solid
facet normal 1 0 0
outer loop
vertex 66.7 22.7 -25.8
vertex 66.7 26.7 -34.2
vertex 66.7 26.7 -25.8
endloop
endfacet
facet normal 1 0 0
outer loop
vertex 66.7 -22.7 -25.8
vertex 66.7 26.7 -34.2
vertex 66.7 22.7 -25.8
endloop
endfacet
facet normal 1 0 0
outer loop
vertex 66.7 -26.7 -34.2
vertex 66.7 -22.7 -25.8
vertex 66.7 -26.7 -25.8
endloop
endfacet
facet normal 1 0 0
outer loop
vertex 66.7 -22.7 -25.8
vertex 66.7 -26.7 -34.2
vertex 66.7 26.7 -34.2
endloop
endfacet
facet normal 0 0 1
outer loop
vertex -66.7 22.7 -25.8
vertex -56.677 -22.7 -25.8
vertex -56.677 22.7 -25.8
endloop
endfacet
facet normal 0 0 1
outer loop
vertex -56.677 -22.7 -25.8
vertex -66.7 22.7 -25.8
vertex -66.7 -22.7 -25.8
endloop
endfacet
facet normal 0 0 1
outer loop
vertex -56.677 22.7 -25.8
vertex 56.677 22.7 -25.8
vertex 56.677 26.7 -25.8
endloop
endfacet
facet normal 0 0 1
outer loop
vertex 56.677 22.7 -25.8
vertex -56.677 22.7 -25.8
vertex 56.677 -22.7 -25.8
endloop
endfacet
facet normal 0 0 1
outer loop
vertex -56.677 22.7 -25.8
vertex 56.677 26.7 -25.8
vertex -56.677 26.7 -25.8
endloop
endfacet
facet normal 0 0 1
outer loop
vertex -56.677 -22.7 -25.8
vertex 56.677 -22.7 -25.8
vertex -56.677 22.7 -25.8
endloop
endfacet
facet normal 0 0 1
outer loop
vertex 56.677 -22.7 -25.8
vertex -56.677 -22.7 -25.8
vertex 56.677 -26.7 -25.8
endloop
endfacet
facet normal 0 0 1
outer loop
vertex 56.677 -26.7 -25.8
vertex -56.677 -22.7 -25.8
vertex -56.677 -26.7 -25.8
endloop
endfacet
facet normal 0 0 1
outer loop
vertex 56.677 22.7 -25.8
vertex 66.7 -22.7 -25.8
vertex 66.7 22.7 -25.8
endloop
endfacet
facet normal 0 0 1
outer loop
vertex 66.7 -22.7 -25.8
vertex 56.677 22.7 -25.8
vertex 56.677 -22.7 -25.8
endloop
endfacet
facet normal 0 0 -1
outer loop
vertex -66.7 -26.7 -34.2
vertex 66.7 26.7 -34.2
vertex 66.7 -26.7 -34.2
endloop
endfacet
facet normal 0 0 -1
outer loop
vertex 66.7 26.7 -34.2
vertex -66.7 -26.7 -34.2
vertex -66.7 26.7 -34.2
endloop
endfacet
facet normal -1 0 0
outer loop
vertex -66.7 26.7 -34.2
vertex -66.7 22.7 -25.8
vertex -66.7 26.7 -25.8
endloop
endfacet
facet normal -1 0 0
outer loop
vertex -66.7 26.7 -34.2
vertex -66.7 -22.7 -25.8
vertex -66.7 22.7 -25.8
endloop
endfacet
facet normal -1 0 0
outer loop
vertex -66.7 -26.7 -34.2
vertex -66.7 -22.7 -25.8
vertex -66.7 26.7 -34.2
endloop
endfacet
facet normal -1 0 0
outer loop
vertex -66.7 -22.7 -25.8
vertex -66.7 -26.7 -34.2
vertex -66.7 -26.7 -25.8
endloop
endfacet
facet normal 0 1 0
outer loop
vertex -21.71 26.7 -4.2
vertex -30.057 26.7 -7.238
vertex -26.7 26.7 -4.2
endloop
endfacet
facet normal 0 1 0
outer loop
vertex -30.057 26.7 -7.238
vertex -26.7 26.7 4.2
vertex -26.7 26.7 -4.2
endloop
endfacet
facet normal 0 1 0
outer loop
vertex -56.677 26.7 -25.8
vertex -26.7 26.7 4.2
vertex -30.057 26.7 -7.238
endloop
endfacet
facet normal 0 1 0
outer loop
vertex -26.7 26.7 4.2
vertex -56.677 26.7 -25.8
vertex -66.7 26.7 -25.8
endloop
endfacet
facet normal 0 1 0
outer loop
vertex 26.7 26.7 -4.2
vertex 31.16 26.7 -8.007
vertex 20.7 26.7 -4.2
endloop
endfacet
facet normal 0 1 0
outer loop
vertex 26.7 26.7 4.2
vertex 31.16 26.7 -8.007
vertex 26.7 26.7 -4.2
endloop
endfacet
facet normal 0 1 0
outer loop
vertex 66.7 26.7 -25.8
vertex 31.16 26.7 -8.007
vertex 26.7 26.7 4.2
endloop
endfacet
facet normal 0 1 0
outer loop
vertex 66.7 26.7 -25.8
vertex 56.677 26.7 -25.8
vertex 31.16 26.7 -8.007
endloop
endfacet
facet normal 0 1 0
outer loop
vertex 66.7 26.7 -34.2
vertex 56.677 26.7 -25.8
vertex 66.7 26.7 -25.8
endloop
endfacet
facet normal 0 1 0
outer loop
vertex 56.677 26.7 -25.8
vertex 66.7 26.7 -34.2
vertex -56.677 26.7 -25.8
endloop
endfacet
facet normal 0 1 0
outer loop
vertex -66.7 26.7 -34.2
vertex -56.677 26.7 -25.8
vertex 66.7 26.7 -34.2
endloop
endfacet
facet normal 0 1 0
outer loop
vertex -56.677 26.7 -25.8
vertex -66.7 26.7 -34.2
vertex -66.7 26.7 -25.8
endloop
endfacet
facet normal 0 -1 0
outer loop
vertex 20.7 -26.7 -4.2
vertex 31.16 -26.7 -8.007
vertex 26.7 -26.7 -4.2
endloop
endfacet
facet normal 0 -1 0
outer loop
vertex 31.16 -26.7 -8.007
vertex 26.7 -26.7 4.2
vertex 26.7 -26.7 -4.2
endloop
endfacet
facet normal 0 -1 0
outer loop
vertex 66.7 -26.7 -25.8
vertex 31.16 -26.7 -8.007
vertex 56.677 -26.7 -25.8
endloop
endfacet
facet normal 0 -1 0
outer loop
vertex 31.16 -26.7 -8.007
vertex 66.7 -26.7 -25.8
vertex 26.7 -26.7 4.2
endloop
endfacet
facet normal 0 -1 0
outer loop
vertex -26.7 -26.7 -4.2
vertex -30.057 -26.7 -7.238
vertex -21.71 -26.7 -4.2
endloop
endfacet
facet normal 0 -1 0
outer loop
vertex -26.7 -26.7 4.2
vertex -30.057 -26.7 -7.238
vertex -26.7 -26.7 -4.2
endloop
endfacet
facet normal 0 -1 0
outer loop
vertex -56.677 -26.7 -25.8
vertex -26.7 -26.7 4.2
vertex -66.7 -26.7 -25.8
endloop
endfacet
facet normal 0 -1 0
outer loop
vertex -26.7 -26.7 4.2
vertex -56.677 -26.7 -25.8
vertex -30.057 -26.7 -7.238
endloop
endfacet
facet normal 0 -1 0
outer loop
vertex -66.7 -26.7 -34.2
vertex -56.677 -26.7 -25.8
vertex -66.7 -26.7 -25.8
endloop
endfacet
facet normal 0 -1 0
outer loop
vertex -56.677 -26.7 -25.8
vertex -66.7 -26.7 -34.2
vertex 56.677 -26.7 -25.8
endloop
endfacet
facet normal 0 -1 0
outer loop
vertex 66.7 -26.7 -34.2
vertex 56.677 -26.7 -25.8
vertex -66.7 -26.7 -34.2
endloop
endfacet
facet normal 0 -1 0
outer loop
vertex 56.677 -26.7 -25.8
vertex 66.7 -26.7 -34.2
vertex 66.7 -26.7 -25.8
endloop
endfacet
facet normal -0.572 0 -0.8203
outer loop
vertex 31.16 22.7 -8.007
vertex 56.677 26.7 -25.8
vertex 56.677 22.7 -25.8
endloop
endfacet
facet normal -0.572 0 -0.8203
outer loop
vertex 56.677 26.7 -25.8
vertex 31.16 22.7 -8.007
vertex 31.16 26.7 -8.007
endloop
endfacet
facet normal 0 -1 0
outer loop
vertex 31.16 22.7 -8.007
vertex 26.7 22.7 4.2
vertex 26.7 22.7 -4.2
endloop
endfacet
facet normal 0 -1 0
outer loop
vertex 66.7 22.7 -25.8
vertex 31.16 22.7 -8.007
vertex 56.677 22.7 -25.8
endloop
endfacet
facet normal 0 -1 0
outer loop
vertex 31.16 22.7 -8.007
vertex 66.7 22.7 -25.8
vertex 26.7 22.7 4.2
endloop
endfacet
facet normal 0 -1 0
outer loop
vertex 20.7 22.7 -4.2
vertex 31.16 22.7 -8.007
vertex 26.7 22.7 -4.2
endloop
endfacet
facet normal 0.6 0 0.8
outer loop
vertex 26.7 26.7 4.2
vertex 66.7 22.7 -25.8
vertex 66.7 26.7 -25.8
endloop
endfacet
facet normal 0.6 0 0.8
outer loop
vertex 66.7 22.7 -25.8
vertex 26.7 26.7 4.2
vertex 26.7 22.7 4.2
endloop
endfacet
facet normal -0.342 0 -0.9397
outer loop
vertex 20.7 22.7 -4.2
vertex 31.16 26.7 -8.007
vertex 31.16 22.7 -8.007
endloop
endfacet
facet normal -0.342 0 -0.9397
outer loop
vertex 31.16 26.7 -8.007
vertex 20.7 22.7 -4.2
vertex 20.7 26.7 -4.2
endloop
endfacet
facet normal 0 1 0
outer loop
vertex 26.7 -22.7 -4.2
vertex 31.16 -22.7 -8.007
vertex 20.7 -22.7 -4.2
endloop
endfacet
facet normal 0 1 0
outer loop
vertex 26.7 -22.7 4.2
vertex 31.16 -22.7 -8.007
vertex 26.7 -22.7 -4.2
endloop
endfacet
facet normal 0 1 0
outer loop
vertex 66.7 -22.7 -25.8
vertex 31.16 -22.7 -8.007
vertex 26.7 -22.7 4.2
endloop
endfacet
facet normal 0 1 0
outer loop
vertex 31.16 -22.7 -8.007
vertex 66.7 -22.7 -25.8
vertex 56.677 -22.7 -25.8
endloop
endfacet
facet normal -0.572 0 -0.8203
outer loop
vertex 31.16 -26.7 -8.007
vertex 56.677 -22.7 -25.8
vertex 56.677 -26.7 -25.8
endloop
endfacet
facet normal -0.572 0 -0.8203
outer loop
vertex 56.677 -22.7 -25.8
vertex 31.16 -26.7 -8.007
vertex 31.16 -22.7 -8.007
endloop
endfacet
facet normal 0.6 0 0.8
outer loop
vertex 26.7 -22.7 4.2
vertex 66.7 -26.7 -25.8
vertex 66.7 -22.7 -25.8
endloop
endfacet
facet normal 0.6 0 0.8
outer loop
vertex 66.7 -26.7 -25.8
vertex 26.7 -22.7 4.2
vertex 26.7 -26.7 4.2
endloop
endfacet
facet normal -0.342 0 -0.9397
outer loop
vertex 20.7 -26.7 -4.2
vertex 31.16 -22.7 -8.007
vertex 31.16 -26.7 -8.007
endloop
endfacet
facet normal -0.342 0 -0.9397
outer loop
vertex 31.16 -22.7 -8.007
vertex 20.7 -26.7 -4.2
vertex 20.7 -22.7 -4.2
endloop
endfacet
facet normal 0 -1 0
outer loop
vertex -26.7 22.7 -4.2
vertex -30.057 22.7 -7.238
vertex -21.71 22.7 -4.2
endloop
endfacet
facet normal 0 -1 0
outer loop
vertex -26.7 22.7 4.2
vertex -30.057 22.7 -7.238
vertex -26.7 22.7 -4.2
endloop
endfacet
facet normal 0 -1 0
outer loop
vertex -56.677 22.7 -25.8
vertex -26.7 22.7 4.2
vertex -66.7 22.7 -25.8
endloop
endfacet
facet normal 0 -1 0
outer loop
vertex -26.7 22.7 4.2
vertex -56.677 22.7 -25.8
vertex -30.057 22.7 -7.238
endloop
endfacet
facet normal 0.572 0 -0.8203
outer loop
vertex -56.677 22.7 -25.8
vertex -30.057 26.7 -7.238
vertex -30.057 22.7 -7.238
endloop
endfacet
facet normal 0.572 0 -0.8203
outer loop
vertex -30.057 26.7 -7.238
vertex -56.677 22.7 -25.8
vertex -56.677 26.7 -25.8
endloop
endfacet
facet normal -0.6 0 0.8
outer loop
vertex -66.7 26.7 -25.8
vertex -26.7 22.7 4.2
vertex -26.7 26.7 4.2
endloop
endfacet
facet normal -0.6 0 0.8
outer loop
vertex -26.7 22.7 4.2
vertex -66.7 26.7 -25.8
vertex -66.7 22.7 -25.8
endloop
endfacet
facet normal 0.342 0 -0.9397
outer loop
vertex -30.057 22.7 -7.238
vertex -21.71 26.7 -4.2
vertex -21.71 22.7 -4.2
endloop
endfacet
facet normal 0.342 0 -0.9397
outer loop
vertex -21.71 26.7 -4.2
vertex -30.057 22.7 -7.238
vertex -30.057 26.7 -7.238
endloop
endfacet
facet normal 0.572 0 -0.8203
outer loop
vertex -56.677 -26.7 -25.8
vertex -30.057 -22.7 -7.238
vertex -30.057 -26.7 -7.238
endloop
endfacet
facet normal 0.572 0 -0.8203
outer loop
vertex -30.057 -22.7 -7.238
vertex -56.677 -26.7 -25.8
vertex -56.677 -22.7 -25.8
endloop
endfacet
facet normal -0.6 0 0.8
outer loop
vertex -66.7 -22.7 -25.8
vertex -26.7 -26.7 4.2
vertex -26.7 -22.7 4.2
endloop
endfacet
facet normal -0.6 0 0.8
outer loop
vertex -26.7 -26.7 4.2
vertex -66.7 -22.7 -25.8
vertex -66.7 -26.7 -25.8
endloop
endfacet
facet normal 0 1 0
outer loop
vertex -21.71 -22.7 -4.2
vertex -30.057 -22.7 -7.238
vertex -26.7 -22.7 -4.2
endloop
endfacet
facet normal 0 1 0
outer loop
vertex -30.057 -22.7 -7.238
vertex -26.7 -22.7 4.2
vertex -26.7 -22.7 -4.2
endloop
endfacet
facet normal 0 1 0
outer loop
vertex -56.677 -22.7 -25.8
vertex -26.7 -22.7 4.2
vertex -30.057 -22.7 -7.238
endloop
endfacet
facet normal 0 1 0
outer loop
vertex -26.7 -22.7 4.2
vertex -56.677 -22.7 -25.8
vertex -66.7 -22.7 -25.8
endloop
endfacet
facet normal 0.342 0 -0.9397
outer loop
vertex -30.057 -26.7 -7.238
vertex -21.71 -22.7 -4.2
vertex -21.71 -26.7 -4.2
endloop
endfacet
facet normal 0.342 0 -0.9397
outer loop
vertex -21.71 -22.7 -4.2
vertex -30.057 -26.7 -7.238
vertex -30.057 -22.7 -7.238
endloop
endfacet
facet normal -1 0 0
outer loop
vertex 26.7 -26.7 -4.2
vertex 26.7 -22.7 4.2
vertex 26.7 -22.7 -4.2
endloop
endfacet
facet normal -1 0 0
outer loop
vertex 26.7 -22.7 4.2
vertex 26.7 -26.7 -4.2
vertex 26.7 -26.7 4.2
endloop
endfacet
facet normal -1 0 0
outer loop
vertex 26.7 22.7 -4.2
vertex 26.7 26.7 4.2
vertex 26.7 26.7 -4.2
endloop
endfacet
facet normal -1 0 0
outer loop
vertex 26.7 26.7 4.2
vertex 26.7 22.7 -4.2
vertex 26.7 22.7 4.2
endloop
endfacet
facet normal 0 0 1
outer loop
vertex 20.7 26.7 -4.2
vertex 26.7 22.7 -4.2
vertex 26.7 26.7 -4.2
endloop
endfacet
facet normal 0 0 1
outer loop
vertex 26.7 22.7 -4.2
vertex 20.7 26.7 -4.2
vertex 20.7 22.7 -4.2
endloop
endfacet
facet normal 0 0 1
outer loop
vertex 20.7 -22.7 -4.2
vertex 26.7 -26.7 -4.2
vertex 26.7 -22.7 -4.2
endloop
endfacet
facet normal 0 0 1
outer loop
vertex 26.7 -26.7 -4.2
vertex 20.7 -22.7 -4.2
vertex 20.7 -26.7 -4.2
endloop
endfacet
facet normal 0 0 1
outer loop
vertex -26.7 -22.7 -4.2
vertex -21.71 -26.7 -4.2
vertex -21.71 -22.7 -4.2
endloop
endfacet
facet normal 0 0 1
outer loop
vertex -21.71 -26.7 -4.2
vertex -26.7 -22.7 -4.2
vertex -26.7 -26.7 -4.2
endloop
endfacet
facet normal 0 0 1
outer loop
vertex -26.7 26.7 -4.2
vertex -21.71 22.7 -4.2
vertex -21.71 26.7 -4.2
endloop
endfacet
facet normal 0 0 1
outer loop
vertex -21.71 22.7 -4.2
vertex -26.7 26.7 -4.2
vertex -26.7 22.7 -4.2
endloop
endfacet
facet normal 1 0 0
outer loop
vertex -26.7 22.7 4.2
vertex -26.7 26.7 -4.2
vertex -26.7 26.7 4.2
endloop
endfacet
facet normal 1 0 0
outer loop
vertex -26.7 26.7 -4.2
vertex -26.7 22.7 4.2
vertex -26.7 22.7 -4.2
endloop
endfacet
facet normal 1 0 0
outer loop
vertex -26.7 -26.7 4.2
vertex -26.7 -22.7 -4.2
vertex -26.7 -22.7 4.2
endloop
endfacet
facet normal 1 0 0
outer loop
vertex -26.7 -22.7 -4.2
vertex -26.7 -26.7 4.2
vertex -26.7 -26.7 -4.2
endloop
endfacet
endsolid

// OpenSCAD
$fn = 400;

// Bring in top for measuring
//import("solar-neopixel-holder-336d957.stl");

$top = [53.4, 53.4, 8.4]; //static dimensions from solar-neo-holder

$bottomTh = 8.4;
$bottom = [$top[0] + 80, $top[1], $bottomTh];

$caseTotalTh = 30;

$carrierTh = 4;
difference() {
	union() {
		translate([0, 0, -$caseTotalTh])
		cube(size = $bottom, center = true);

		hull() {
			translate([$bottom[0] / 2 - 4, $bottom[1] / 2 - 4, -$caseTotalTh])
			cube(size = [4, 4, $bottom[2] / 2]);

			translate([$top[0] / 2 - 1, $top[1] / 2 - 4, -$top[2] / 2])
			cube(size = [1, 4, $top[2]]);
		}
		translate([$top[0] / 2 - 6, $top[1] / 2 - 4, -$top[2] / 2 ])
		rotate([0, 20, 0])
		cube(size = [12, 4, $top[2] - 2]);
		hull() {
			translate([$bottom[0] / 2 - 4, -$bottom[1] / 2, -$caseTotalTh])
			cube(size = [4, 4, $bottom[2] / 2]);
	
			translate([$top[0] / 2 - 1, -$top[1] / 2, -$top[2] / 2])
			cube(size = [1, 4, $top[2]]);
		}
		translate([$top[0] / 2 - 6, -$top[1] / 2 , -$top[2] / 2 ])
		rotate([0, 20, 0])
		cube(size = [12, 4, $top[2] - 2]);
		hull() {
			translate([-$bottom[0] / 2, $bottom[1] / 2 - 4, -$caseTotalTh])
			cube(size = [4, 4, $bottom[2] / 2]);
	
			translate([-$top[0] / 2, $top[1] / 2 - 4, -$top[2] / 2])
			cube(size = [1, 4, $top[2]]);
		}
		translate([-$top[0] / 2 - 6, $top[1] / 2  - 4, -$top[2] / 2 - 4])
		rotate([0, -20, 0])
		cube(size = [12, 4, $top[2] - 2]);
		hull() {
			translate([-$bottom[0] / 2, -$bottom[1] / 2, -$caseTotalTh])
			cube(size = [4, 4, $bottom[2] / 2]);
	
			translate([-$top[0] / 2, -$top[1] / 2, -$top[2] / 2])
			cube(size = [1, 4, $top[2]]);
		}
		translate([-$top[0] / 2 - 6, -$top[1] / 2  , -$top[2] / 2 - 4])
		rotate([0, -20, 0])
		cube(size = [12, 4, $top[2] - 2]);
	}

	//Cut seat for top
	cube(size = $top, center = true);
}
